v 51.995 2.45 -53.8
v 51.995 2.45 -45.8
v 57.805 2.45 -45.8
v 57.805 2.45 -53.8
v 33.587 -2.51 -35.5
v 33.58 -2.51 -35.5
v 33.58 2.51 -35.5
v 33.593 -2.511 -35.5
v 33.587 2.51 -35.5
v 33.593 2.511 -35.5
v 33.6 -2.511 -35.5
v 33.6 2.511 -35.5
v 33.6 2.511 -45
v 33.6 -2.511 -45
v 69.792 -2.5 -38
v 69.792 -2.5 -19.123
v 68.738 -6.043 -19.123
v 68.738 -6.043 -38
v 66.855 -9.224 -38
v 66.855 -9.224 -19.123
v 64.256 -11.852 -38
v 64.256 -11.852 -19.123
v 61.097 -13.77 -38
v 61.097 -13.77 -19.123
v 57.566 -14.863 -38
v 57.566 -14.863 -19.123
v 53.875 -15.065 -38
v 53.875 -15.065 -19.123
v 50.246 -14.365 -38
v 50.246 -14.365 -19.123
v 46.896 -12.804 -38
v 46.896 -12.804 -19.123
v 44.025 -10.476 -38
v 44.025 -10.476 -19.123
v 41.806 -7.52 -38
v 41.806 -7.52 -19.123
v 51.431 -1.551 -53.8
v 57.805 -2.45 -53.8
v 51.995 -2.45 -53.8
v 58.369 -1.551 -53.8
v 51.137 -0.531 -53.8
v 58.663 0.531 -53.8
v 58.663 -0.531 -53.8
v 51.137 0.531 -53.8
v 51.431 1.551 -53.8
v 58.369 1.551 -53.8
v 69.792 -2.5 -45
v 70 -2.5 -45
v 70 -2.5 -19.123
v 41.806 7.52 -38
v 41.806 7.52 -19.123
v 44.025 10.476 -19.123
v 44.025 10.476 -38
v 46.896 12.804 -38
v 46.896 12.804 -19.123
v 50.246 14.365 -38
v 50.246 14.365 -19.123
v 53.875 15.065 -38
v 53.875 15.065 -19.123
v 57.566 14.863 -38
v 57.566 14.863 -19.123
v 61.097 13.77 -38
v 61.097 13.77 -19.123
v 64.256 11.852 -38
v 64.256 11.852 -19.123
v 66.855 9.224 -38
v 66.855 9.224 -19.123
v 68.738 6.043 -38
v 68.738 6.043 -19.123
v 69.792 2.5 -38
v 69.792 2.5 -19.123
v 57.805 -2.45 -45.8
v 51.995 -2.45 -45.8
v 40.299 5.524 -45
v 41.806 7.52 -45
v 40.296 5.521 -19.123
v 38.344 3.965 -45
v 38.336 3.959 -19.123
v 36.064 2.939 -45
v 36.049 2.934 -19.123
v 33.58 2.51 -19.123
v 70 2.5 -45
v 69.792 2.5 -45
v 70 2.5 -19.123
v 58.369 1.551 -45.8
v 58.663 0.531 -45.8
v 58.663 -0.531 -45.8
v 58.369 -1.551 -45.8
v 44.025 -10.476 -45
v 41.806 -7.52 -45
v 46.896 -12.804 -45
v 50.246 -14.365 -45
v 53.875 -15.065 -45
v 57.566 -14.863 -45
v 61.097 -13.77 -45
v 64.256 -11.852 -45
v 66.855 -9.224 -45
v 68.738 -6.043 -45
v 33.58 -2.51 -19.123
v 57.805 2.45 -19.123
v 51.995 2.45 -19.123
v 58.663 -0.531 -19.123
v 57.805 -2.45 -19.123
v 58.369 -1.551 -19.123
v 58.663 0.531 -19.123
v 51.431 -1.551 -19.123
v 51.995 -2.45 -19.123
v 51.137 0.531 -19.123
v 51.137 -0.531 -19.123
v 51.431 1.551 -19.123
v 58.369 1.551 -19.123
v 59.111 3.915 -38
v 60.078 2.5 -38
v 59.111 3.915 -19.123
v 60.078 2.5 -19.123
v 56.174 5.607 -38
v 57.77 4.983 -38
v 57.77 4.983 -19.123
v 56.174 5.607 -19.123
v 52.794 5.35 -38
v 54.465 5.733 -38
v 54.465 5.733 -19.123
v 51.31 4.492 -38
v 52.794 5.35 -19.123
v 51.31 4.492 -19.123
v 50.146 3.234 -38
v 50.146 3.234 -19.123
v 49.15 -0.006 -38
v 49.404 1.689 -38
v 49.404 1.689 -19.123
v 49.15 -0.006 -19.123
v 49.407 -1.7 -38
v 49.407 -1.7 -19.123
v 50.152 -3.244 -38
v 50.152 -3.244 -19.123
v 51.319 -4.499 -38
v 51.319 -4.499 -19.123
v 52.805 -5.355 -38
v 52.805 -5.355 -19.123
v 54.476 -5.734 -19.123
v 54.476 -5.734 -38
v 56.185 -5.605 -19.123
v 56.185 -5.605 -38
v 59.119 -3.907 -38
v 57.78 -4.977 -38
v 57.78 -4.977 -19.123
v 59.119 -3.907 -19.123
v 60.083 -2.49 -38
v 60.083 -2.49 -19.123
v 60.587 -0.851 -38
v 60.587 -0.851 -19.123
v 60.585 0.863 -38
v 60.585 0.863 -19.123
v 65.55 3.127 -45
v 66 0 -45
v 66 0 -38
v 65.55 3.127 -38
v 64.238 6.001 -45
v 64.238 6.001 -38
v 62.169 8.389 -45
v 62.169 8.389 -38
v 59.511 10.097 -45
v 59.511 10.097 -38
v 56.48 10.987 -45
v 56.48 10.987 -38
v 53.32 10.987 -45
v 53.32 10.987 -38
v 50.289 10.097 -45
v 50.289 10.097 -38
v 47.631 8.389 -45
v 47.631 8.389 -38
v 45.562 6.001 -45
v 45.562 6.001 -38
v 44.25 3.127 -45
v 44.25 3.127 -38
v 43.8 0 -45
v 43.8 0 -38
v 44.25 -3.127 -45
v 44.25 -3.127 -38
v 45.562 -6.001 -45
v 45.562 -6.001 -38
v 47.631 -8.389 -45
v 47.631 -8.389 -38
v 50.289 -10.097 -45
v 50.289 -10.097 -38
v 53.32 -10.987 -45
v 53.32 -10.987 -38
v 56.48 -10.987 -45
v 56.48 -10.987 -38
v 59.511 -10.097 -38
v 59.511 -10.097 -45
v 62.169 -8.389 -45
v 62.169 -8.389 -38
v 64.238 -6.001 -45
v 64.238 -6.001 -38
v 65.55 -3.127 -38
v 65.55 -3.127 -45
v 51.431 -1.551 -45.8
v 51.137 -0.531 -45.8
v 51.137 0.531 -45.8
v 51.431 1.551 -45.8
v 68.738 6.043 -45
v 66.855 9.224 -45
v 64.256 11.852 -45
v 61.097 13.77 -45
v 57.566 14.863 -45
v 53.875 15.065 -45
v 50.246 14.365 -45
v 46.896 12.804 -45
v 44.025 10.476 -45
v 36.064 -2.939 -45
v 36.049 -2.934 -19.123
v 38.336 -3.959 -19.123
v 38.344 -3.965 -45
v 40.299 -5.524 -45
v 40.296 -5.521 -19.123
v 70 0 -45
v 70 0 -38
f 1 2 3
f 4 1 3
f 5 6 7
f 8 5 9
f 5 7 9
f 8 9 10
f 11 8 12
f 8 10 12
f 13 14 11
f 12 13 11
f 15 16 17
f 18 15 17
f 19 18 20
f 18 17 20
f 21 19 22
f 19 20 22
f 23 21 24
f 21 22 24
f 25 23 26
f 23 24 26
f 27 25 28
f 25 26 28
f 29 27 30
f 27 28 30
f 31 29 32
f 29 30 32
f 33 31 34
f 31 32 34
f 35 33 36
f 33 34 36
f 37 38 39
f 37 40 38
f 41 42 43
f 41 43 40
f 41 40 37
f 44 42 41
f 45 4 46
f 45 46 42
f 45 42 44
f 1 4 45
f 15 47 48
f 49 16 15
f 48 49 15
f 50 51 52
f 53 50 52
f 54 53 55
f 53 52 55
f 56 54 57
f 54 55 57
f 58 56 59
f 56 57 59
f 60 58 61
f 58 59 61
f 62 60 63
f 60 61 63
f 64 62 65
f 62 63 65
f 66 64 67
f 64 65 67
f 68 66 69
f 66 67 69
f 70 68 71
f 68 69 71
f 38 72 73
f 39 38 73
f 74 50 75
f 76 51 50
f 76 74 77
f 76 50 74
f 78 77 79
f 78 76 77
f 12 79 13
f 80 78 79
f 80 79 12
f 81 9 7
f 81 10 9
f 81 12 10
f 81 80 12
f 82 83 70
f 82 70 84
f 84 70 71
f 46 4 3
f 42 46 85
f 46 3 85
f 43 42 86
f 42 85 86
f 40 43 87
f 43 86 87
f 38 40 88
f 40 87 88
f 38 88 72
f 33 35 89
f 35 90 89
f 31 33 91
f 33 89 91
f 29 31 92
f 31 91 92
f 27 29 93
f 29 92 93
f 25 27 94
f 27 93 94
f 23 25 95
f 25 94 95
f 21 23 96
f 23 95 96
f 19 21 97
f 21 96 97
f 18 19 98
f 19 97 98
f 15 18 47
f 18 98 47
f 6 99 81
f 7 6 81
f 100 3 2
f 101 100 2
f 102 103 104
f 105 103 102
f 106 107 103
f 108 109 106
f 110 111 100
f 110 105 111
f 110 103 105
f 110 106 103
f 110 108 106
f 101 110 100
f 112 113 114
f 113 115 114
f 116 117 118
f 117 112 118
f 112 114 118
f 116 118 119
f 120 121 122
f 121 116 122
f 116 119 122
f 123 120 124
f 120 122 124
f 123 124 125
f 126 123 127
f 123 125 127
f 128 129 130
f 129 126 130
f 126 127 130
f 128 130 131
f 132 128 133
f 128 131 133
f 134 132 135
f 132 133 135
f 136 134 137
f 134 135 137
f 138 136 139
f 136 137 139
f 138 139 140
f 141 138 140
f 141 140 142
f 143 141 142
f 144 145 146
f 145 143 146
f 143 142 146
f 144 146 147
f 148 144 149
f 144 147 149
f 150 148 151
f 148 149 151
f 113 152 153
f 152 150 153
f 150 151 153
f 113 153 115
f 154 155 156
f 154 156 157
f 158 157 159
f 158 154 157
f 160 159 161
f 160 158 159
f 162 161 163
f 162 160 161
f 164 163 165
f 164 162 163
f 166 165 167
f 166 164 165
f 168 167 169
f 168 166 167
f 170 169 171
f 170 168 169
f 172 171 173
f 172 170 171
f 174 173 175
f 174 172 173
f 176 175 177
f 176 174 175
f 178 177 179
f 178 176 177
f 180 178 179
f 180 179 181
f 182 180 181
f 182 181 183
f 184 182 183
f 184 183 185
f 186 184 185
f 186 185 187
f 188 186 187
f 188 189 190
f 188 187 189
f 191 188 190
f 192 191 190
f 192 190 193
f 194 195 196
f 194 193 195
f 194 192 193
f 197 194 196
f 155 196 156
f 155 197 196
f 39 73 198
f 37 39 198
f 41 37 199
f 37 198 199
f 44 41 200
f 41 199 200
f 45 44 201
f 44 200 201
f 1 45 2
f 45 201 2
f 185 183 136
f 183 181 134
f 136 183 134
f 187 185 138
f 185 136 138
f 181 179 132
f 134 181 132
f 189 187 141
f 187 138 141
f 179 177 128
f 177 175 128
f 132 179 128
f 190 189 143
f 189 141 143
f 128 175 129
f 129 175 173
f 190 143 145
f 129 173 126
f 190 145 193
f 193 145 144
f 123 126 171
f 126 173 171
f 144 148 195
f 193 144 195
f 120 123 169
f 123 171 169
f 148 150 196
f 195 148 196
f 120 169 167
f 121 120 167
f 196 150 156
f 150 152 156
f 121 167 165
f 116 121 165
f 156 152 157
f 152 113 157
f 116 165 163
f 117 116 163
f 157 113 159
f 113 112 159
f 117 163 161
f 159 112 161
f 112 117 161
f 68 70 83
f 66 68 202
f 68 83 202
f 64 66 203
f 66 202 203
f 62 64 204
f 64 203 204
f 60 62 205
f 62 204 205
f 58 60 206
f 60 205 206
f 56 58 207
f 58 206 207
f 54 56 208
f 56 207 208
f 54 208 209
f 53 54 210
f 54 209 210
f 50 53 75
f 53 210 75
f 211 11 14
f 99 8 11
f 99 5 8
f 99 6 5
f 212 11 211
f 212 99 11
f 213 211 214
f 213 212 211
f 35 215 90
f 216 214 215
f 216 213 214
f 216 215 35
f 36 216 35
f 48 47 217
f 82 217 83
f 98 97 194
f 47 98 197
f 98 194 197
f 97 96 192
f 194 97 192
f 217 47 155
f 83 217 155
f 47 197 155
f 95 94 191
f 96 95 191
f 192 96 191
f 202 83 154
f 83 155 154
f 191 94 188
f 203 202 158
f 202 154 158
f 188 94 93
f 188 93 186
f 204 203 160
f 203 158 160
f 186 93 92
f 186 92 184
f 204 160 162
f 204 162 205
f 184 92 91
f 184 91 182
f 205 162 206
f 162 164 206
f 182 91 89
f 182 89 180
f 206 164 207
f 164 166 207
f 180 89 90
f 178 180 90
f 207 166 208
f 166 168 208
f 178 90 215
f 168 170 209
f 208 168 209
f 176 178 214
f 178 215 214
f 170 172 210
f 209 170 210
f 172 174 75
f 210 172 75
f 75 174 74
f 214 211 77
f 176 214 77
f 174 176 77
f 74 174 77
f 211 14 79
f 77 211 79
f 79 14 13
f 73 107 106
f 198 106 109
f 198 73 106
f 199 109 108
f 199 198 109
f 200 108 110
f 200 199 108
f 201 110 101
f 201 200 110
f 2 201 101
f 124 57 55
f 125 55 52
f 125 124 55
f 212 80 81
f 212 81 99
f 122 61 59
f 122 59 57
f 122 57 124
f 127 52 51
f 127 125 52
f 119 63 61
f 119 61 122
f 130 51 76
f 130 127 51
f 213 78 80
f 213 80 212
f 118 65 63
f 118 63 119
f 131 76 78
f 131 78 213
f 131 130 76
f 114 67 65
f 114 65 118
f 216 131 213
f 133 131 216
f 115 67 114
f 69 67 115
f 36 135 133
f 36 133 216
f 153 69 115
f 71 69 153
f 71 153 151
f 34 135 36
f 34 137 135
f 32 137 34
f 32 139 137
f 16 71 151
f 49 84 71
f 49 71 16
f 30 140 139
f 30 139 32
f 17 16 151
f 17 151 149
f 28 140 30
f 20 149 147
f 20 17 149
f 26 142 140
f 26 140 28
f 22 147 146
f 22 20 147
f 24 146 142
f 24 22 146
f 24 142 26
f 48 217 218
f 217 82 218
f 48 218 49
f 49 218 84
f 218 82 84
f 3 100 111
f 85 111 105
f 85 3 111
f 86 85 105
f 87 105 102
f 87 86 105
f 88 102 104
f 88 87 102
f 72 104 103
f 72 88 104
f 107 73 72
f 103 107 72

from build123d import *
from build123d.topology import SkipClean

# Parameters (mm, degrees)
SKETCH1_W                = 140
SKETCH1_H                = 90
BOSS_EXTRUDE1_DEPTH      = 2.5
SKETCH2_W                = 27.1
SKETCH2_H                = 30.8
SKETCH2_W_2              = 19.1
SKETCH2_H_2              = 22.8
BOSS_EXTRUDE2_DEPTH      = 40.6
SKETCH3_W                = 19.1
SKETCH3_H                = 22.8
BOSS_EXTRUDE3_DEPTH      = 4
CUT_EXTRUDE1_REACH       = 158.444
SKETCH4_W                = 5
SKETCH4_H                = 8
FILLET1_R                = 25
SKETCH5_W                = 38.1
SKETCH5_H                = 8
CUT_EXTRUDE2_DEPTH       = 39.6
CUT_EXTRUDE3_REACH       = 101.288
SKETCH6_W                = 55
SKETCH6_H                = 9.5
CUT_EXTRUDE4_REACH       = 135.898
SKETCH9_R                = 15.1
SKETCH9_R_2              = 11.1
BOSS_EXTRUDE4_DEPTH      = 7
SKETCH10_R               = 11.1
CUT_EXTRUDE5_DEPTH       = 7
SKETCH11_R               = 5.75
CUT_EXTRUDE6_DEPTH       = 76
BOSS_EXTRUDE5_DEPTH      = 76
SKETCH13_R               = 11.1
SKETCH13_R_2             = 5.75
BOSS_EXTRUDE6_DEPTH      = 76
SKETCH14_W               = 38.246600132
SKETCH14_H               = 12.6
CUT_EXTRUDE7_DEPTH       = 157.444143387
SKETCH15_R               = 3.8
BOSS_EXTRUDE7_DEPTH      = 90
SKETCH16_R               = 3.8
BOSS_EXTRUDE8_DEPTH      = 0.8
BOSS_EXTRUDE9_DEPTH      = 6
FILLET2_R                = 2
CHAMFER1_SIZE            = 1.6
FILLET3_R                = 10
FILLET4_R                = 5
CUT_EXTRUDE9_DEPTH       = 135.574774806
CUT_EXTRUDE10_DEPTH      = 157.444143476
CUT_EXTRUDE10_DEPTH_BACK = 157.444143476
SKETCH20_W               = 91.164780252
SKETCH20_H               = 36.856817744
CUT_EXTRUDE11_DEPTH      = 79.739570827
CUT_EXTRUDE11_DEPTH_BACK = 79.739570827
SKETCH21_W               = 114.516410758
SKETCH21_H               = 52.09205151
CUT_EXTRUDE12_DEPTH      = 6
BOSS_EXTRUDE10_DEPTH     = 8


# Read off the part's stored shape, not the designer's step: Mirror1
with BuildPart() as part:
    # Sketch1 → Boss-Extrude1 (new, symmetric)
    with BuildSketch(Plane(origin=(0, 0, 0), x_dir=(1, 0, 0), z_dir=(0, 1, 0))):
        Rectangle(SKETCH1_W, SKETCH1_H)
    extrude(amount=BOSS_EXTRUDE1_DEPTH, both=True)

    # Sketch2 → Boss-Extrude2 (add)
    with BuildSketch(Plane.ZY.offset(70)):
        with Locations((54.55, 0)):
            Rectangle(SKETCH2_W, SKETCH2_H)
        with Locations((54.55, 0)):
            Rectangle(SKETCH2_W_2, SKETCH2_H_2, mode=Mode.SUBTRACT)
    extrude(amount=-BOSS_EXTRUDE2_DEPTH)

    # Sketch3 → Boss-Extrude3 (add)
    with BuildSketch(Plane.ZY.offset(70)):
        with Locations((54.55, 0)):
            Rectangle(SKETCH3_W, SKETCH3_H)
    extrude(amount=-BOSS_EXTRUDE3_DEPTH)

    # Sketch4 → Cut-Extrude1 (cut, up to next)
    with BuildSketch(Plane.ZY.offset(70), mode=Mode.PRIVATE) as cut_extrude1_sk1:
        with Locations((54.55, 0)):
            Rectangle(SKETCH4_W, SKETCH4_H)
    cut_extrude1_tool1 = extrude(cut_extrude1_sk1.sketch, amount=-CUT_EXTRUDE1_REACH, mode=Mode.PRIVATE) & part.part
    add(cut_extrude1_tool1.solids().sort_by_distance((-70, 0, 54.55))[0], mode=Mode.SUBTRACT)

    # Fillet1
    # the kernel refuses this fillet: 25 mm, written as the material it adds along each edge
    with BuildSketch(Plane(origin=(-70, -2.5, 41), x_dir=(0, 0, -1), z_dir=(1, 0, 0))) as fillet1_piece_1:
        with BuildLine():
            CenterArc((21.876699934, -25), FILLET1_R, 90, 61.053024114)
            Line((0, -12.9), (-0.437533999, -12.658))
            ThreePointArc((-0.437533999, -12.658), (-0.5, -6.45), (-0.5, 0))
            Line((-0.5, 0), (0, 0.5))
            Line((0, 0.5), (21.876699934, 0.5))
            Line((21.876699934, 0.5), (21.876699934, 0))
        make_face()
    extrude(amount=40.6)
    with BuildSketch(Plane(origin=(-70, 2.5, 41), x_dir=(0, 0, -1), z_dir=(1, 0, 0))) as fillet1_piece_2:
        with BuildLine():
            CenterArc((21.876699934, 25), FILLET1_R, 208.946975886, 61.053024114)
            Line((0, 12.9), (-0.437533999, 12.658))
            ThreePointArc((-0.437533999, 12.658), (-0.5, 6.45), (-0.5, 0))
            Line((-0.5, 0), (0, -0.5))
            Line((0, -0.5), (21.876699934, -0.5))
            Line((21.876699934, -0.5), (21.876699934, 0))
        make_face()
    extrude(amount=40.6)

    # Sketch5 → Cut-Extrude2 (cut)
    with BuildSketch(Plane(origin=(-21.4, 0, 0), x_dir=(0, 0, -1), z_dir=(1, 0, 0))):
        with Locations((-54.55, 0)):
            Rectangle(SKETCH5_W, SKETCH5_H)
    extrude(amount=-CUT_EXTRUDE2_DEPTH, mode=Mode.SUBTRACT)

    # Sketch6 → Cut-Extrude3 (cut, up to next)
    with BuildSketch(Plane(origin=(0, 2.5, 0), x_dir=(1, 0, 0), z_dir=(0, 1, 0)), mode=Mode.PRIVATE) as cut_extrude3_sk1:
        with Locations((6.1, -40.25)):
            Rectangle(SKETCH6_W, SKETCH6_H)
    cut_extrude3_tool1 = extrude(cut_extrude3_sk1.sketch, amount=-CUT_EXTRUDE3_REACH, mode=Mode.PRIVATE) & part.part
    add(cut_extrude3_tool1.solids().sort_by_distance((6.1, 2.5, 40.25))[0], mode=Mode.SUBTRACT)

    # Sketch8 → Cut-Extrude4 (cut, up to next)
    with BuildSketch(Plane.XY.offset(68.1), mode=Mode.PRIVATE) as cut_extrude4_sk1:
        with BuildLine():
            Line((-58.5, 7.5), (-28.5, 7.5))
            ThreePointArc((-28.5, 7.5), (-21, 0), (-28.5, -7.5))
            Line((-28.5, -7.5), (-58.5, -7.5))
            ThreePointArc((-58.5, -7.5), (-66, 0), (-58.5, 7.5))
        make_face()
    cut_extrude4_tool1 = extrude(cut_extrude4_sk1.sketch, amount=-CUT_EXTRUDE4_REACH, mode=Mode.PRIVATE) & part.part
    add(cut_extrude4_tool1.solids().sort_by_distance((-43.5, 0, 68.1))[0], mode=Mode.SUBTRACT)

    # Mirror1
    split(bisect_by=Plane.XY, keep=Keep.TOP)

    # Mirror1 2: part across plane


with BuildPart() as part_1:
    add(part.part)
    add(part.part.mirror(Plane.XY))

    # Sketch9 → Boss-Extrude4 (add)
    with BuildSketch(Plane.XY.offset(45)):
        with Locations((54.9, 0)):
            Circle(SKETCH9_R)
        with Locations((54.9, 0)):
            Circle(SKETCH9_R_2, mode=Mode.SUBTRACT)
    boss_extrude4 = extrude(amount=-BOSS_EXTRUDE4_DEPTH)

    # Sketch10 → Cut-Extrude5 (cut)
    with BuildSketch(Plane.XY.offset(45)):
        with Locations((54.9, 0)):
            Circle(SKETCH10_R)
    cut_extrude5 = extrude(amount=-CUT_EXTRUDE5_DEPTH, mode=Mode.SUBTRACT)

    # Mirror2: Boss-Extrude4, Cut-Extrude5 across plane
    add(boss_extrude4.mirror(Plane.XY))
    add(cut_extrude5.mirror(Plane.XY), mode=Mode.SUBTRACT)

    # Sketch11 → Cut-Extrude6 (cut)
    with BuildSketch(Plane.XY.offset(38)):
        with Locations((54.9, 0)):
            Circle(SKETCH11_R)
    extrude(amount=-CUT_EXTRUDE6_DEPTH, mode=Mode.SUBTRACT)

    # Sketch12 → Boss-Extrude5 (add)
    with BuildSketch(Plane(origin=(0, 0, 38), x_dir=(-1, 0, 0), z_dir=(0, 0, -1))):
        with BuildLine():
            Line((-44.085195332, 2.5), (-40.008391625, 2.5))
            ThreePointArc((-40.008391625, 2.5), (-54.9, 15.1), (-69.791608375, 2.5))
            Line((-69.791608375, 2.5), (-65.714804668, 2.5))
            ThreePointArc((-65.714804668, 2.5), (-54.9, 11.1), (-44.085195332, 2.5))
        make_face()
        with BuildLine():
            Line((-40.008391625, -2.5), (-44.085195332, -2.5))
            ThreePointArc((-44.085195332, -2.5), (-54.9, -11.1), (-65.714804668, -2.5))
            Line((-65.714804668, -2.5), (-69.791608375, -2.5))
            ThreePointArc((-69.791608375, -2.5), (-54.9, -15.1), (-40.008391625, -2.5))
        make_face()
    extrude(amount=BOSS_EXTRUDE5_DEPTH)

    # Sketch13 → Boss-Extrude6 (add)
    with BuildSketch(Plane.XY.offset(38)):
        with Locations((54.9, 0)):
            Circle(SKETCH13_R)
        with Locations((54.9, 0)):
            Circle(SKETCH13_R_2, mode=Mode.SUBTRACT)
    extrude(amount=-BOSS_EXTRUDE6_DEPTH)

    # Sketch14 → Cut-Extrude7 (cut, through all)
    with BuildSketch(Plane.ZY.offset(70)):
        with Locations((0, 8.8)):
            Rectangle(SKETCH14_W, SKETCH14_H)
    extrude(amount=-CUT_EXTRUDE7_DEPTH, mode=Mode.SUBTRACT)

    # Fillet2
    fillet2_edges = [part_1.edges().sort_by_distance(p)[0] for p in [
        (-49.7, 15.4, -68.1),
        (-49.7, 15.4, -41),
        (-49.7, -15.4, -41),
        (-49.7, -15.4, -68.1),
        (-49.7, -15.4, 41),
        (-49.7, 15.4, 41),
        (-49.7, 15.4, 68.1),
        (-49.7, -15.4, 68.1),
    ]]
    fillet(fillet2_edges, radius=FILLET2_R)

    # Chamfer1
    chamfer1_edges = [part_1.edges().sort_by_distance(p)[0] for p in [
        (-43.95, 7.5, 68.1),
        (-66, 0, 68.1),
        (-43.95, -7.5, 68.1),
        (-43.95, 7.5, -68.1),
        (-43.95, -7.5, -68.1),
        (-66, 0, -68.1),
    ]]
    chamfer(chamfer1_edges, length=CHAMFER1_SIZE)

    # Fillet3
    # the kernel refuses this fillet: 10 mm, written as the material it adds along each edge
    with BuildSketch(Plane(origin=(40.008391625, -2.5, 38), x_dir=(0.3370807355447674, -0.9414757446289301, 0), z_dir=(0, 0, -1))) as fillet3_piece_1_section:
        with BuildLine():
            CenterArc((7.097522828, 9.842907234), FILLET3_R, 199.699116173, 60.131704489)
            Line((-2.317234618, 6.472099878), (0, 0))
            ThreePointArc((0, 0), (2.665984943, 0.237210077), (5.331969886, 0))
        make_face()
    fillet3_piece_1 = extrude(amount=76, mode=Mode.PRIVATE)
    fillet3_piece_1 = split(fillet3_piece_1, bisect_by=Plane(origin=(33.6, -3.612944969, 36.75), z_dir=(1, 0, 0)), keep=Keep.TOP, mode=Mode.PRIVATE)
    add(fillet3_piece_1)
    with BuildSketch(Plane(origin=(40.008391625, -2.5, 38), x_dir=(0.3370807355447674, -0.9414757446289301, 0), z_dir=(0, 0, -1))) as fillet3_piece_2_section:
        with BuildLine():
            CenterArc((7.097522828, 9.842907234), FILLET3_R, 199.699116173, 60.131704489)
            Line((-2.317234618, 6.472099878), (0, 0))
            ThreePointArc((0, 0), (2.665984943, 0.237210077), (5.331969886, 0))
        make_face()
    fillet3_piece_2 = extrude(amount=76, mode=Mode.PRIVATE)
    fillet3_piece_2 = split(fillet3_piece_2, bisect_by=Plane(origin=(33.483505518, -2.503259206, 35.5), z_dir=(0, 0, -1)), keep=Keep.TOP, mode=Mode.PRIVATE)
    fillet3_piece_2 = split(fillet3_piece_2, bisect_by=Plane(origin=(33.483505518, -2.503259206, -35.5), z_dir=(0, 0, 1)), keep=Keep.TOP, mode=Mode.PRIVATE)
    add(fillet3_piece_2)
    with BuildSketch(Plane(origin=(40.008391625, 2.5, -19.123300066), x_dir=(0.3370807355447668, 0.9414757446289305, 0), z_dir=(0, 0, -1))) as fillet3_piece_3_section:
        with BuildLine():
            CenterArc((7.097522828, -9.842907234), FILLET3_R, 100.169179339, 60.131704489)
            Line((-2.317234618, -6.472099878), (0, 0))
            ThreePointArc((0, 0), (2.665984943, -0.237210077), (5.331969886, 0))
        make_face()
    fillet3_piece_3 = extrude(amount=43.062750438, mode=Mode.PRIVATE)
    fillet3_piece_3 = split(fillet3_piece_3, bisect_by=Plane(origin=(38.74616156, 3.612944969, -35.5), z_dir=(0, 0, 1)), keep=Keep.TOP, mode=Mode.PRIVATE)
    add(fillet3_piece_3)
    with BuildSketch(Plane(origin=(40.008391625, 2.5, -19.123300066), x_dir=(0.3370807355447668, 0.9414757446289305, 0), z_dir=(0, 0, -1))) as fillet3_piece_4_section:
        with BuildLine():
            CenterArc((7.097522828, -9.842907234), FILLET3_R, 100.169179339, 60.131704489)
            Line((-2.317234618, -6.472099878), (0, 0))
            ThreePointArc((0, 0), (2.665984943, -0.237210077), (5.331969886, 0))
        make_face()
    fillet3_piece_4 = extrude(amount=25.876699934, mode=Mode.PRIVATE)
    fillet3_piece_4 = split(fillet3_piece_4, bisect_by=Plane(origin=(33.6, 3.612944969, -40.25), z_dir=(1, 0, 0)), keep=Keep.TOP, mode=Mode.PRIVATE)
    add(fillet3_piece_4)
    with BuildSketch(Plane(origin=(40.008391625, 2.5, 45), x_dir=(0.3370807355447668, 0.9414757446289305, 0), z_dir=(0, 0, -1))) as fillet3_piece_5_section:
        with BuildLine():
            CenterArc((7.097522828, -9.842907234), FILLET3_R, 100.169179339, 60.131704489)
            Line((-2.317234618, -6.472099878), (0, 0))
            ThreePointArc((0, 0), (2.665984943, -0.237210077), (5.331969886, 0))
        make_face()
    fillet3_piece_5 = extrude(amount=25.876699934, mode=Mode.PRIVATE)
    fillet3_piece_5 = split(fillet3_piece_5, bisect_by=Plane(origin=(33.6, 3.612944969, 40.25), z_dir=(1, 0, 0)), keep=Keep.TOP, mode=Mode.PRIVATE)
    add(fillet3_piece_5)
    with BuildSketch(Plane(origin=(40.008391625, 2.5, 62.186050504), x_dir=(0.3370807355447676, 0.9414757446289301, 0), z_dir=(0, 0, -1))) as fillet3_piece_6_section:
        with BuildLine():
            CenterArc((7.097522828, -9.842907234), FILLET3_R, 100.169179339, 60.131704489)
            Line((-2.317234618, -6.472099878), (0, 0))
            ThreePointArc((0, 0), (2.665984943, -0.237210077), (5.331969886, 0))
        make_face()
    fillet3_piece_6 = extrude(amount=43.062750438, mode=Mode.PRIVATE)
    fillet3_piece_6 = split(fillet3_piece_6, bisect_by=Plane(origin=(33.483505518, 2.503259206, 35.5), z_dir=(0, 0, -1)), keep=Keep.TOP, mode=Mode.PRIVATE)
    add(fillet3_piece_6)
    with BuildSketch(Plane(origin=(40.008391625, -2.5, 38), x_dir=(0.3370807355447675, -0.9414757446289301, 0), z_dir=(0, 0, 1))) as fillet3_piece_7_section:
        with BuildLine():
            CenterArc((7.097522828, -9.842907234), FILLET3_R, 100.169179339, 60.131704489)
            Line((-2.317234618, -6.472099878), (0, 0))
            ThreePointArc((0, 0), (2.665984943, -0.237210077), (5.331969886, 0))
        make_face()
    fillet3_piece_7 = extrude(amount=7, mode=Mode.PRIVATE)
    fillet3_piece_7 = split(fillet3_piece_7, bisect_by=Plane(origin=(33.6, -3.612944969, 41.5), z_dir=(1, 0, 0)), keep=Keep.TOP, mode=Mode.PRIVATE)
    add(fillet3_piece_7)
    with BuildSketch(Plane(origin=(40.008391625, -2.5, -38), x_dir=(0.3370807355447675, -0.9414757446289301, 0), z_dir=(0, 0, -1))) as fillet3_piece_8_section:
        with BuildLine():
            CenterArc((7.097522828, 9.842907234), FILLET3_R, 199.699116173, 60.131704489)
            Line((-2.317234618, 6.472099878), (0, 0))
            ThreePointArc((0, 0), (2.665984943, 0.237210077), (5.331969886, 0))
        make_face()
    fillet3_piece_8 = extrude(amount=7, mode=Mode.PRIVATE)
    fillet3_piece_8 = split(fillet3_piece_8, bisect_by=Plane(origin=(33.6, -3.612944969, -41.5), z_dir=(1, 0, 0)), keep=Keep.TOP, mode=Mode.PRIVATE)
    add(fillet3_piece_8)

    # Fillet4
    fillet4_edges = [part_1.edges().sort_by_distance(p)[0] for p in [
        (-29.4, -2.5, -27.311650033),
        (-29.4, 2.5, -27.311650033),
        (-29.4, 2.5, 27.311650033),
        (-29.4, -2.5, 27.311650033),
    ]]
    fillet(fillet4_edges, radius=FILLET4_R)


with BuildPart() as body_2:
    # Sketch15 → Boss-Extrude7 (new body)
    with BuildSketch(Plane(origin=(0, 0, -45), x_dir=(-1, 0, 0), z_dir=(0, 0, -1))):
        with Locations((-54.9, 0)):
            Circle(SKETCH15_R)
    extrude(amount=-BOSS_EXTRUDE7_DEPTH)

    # Sketch16 → Boss-Extrude8 (add)
    with BuildSketch(Plane(origin=(0, 0, -45), x_dir=(-1, 0, 0), z_dir=(0, 0, -1))):
        with Locations((-54.9, 0)):
            Circle(SKETCH16_R)
    boss_extrude8 = extrude(amount=BOSS_EXTRUDE8_DEPTH)

    # Sketch17 → Boss-Extrude9 (add)
    with BuildSketch(Plane(origin=(0, 0, -45.8), x_dir=(-1, 0, 0), z_dir=(0, 0, -1))):
        with BuildLine():
            Line((-57.672634127, -2.45), (-52.127365873, -2.45))
            ThreePointArc((-52.127365873, -2.45), (-51.2, 0), (-52.127365873, 2.45))
            Line((-52.127365873, 2.45), (-57.672634127, 2.45))
            ThreePointArc((-57.672634127, 2.45), (-58.6, 0), (-57.672634127, -2.45))
        make_face()
    boss_extrude9 = extrude(amount=BOSS_EXTRUDE9_DEPTH)

    # Mirror3: Boss-Extrude8, Boss-Extrude9 across plane
    add(boss_extrude8.mirror(Plane.XY))
    add(boss_extrude9.mirror(Plane.XY))

    # Sketch19 → Cut-Extrude9 (cut, through all)
    with BuildSketch(Plane(origin=(0, 0, -45.8), x_dir=(-1, 0, 0), z_dir=(0, 0, -1))):
        with BuildLine():
            Line((-52.127365873, 2.45), (-51.99526249, 2.45))
            ThreePointArc((-51.99526249, 2.45), (-54.9, 3.8), (-57.80473751, 2.45))
            Line((-57.80473751, 2.45), (-57.672634127, 2.45))
            Line((-57.672634127, 2.45), (-52.127365873, 2.45))
        make_face()
        with BuildLine():
            ThreePointArc((-57.80473751, -2.45), (-54.9, -3.8), (-51.99526249, -2.45))
            Line((-51.99526249, -2.45), (-52.127365873, -2.45))
            Line((-52.127365873, -2.45), (-57.672634127, -2.45))
            Line((-57.672634127, -2.45), (-57.80473751, -2.45))
        make_face()
    extrude(amount=-CUT_EXTRUDE9_DEPTH, mode=Mode.SUBTRACT)


with BuildPart() as cut_extrude10_tool:
    # Sketch20 → Cut-Extrude10 (new, two sides: drawn at the far end of the back side and taken through both)
    with BuildSketch(Plane(origin=(70, 0, 0), x_dir=(0, 0, -1), z_dir=(1, 0, 0)).offset(-CUT_EXTRUDE10_DEPTH_BACK)):
        with Locations((-26.45909006, 0.418827474)):
            Rectangle(SKETCH20_W, SKETCH20_H)
    extrude(amount=CUT_EXTRUDE10_DEPTH + CUT_EXTRUDE10_DEPTH_BACK)


with BuildPart() as part_2:
    add(part_1.part)

    # Cut-Extrude10: cut by cut_extrude10_tool
    add(cut_extrude10_tool.part, mode=Mode.SUBTRACT)

    # Sketch21 → Cut-Extrude11 (cut, two sides: drawn at the far end of the back side and taken through both)
    with BuildSketch(Plane(origin=(0, 0, -35.5), x_dir=(-1, 0, 0), z_dir=(0, 0, -1)).offset(-CUT_EXTRUDE11_DEPTH_BACK)):
        with Locations((23.678205232, -4.663888909)):
            Rectangle(SKETCH21_W, SKETCH21_H)
    extrude(amount=CUT_EXTRUDE11_DEPTH + CUT_EXTRUDE11_DEPTH_BACK, mode=Mode.SUBTRACT)


with BuildPart() as body_2_1:
    add(body_2.part)

    # Cut-Extrude10: cut by cut_extrude10_tool
    add(cut_extrude10_tool.part, mode=Mode.SUBTRACT)

    # Sketch22 → Cut-Extrude12 (cut)
    with BuildSketch(Plane(origin=(0, 0, -51.8), x_dir=(-1, 0, 0), z_dir=(0, 0, -1))):
        with BuildLine():
            Line((-57.672634127, -2.45), (-52.127365873, -2.45))
            ThreePointArc((-52.127365873, -2.45), (-51.2, 0), (-52.127365873, 2.45))
            Line((-52.127365873, 2.45), (-57.672634127, 2.45))
            ThreePointArc((-57.672634127, 2.45), (-58.6, 0), (-57.672634127, -2.45))
        make_face()
    extrude(amount=-CUT_EXTRUDE12_DEPTH, mode=Mode.SUBTRACT)

    # Sketch23 → Boss-Extrude10 (add)
    with SkipClean():  # the faces are left unmerged after this step: merging them gives an invalid solid
        with BuildSketch(Plane(origin=(0, 0, -45.8), x_dir=(-1, 0, 0), z_dir=(0, 0, -1))):
            with BuildLine():
                Line((-57.80473751, -2.45), (-51.99526249, -2.45))
                ThreePointArc((-51.99526249, -2.45), (-51.1, 0), (-51.99526249, 2.45))
                Line((-51.99526249, 2.45), (-57.80473751, 2.45))
                ThreePointArc((-57.80473751, 2.45), (-58.7, 0), (-57.80473751, -2.45))
            make_face()
        extrude(amount=BOSS_EXTRUDE10_DEPTH)


solid = Compound([part_2.part, body_2_1.part])
